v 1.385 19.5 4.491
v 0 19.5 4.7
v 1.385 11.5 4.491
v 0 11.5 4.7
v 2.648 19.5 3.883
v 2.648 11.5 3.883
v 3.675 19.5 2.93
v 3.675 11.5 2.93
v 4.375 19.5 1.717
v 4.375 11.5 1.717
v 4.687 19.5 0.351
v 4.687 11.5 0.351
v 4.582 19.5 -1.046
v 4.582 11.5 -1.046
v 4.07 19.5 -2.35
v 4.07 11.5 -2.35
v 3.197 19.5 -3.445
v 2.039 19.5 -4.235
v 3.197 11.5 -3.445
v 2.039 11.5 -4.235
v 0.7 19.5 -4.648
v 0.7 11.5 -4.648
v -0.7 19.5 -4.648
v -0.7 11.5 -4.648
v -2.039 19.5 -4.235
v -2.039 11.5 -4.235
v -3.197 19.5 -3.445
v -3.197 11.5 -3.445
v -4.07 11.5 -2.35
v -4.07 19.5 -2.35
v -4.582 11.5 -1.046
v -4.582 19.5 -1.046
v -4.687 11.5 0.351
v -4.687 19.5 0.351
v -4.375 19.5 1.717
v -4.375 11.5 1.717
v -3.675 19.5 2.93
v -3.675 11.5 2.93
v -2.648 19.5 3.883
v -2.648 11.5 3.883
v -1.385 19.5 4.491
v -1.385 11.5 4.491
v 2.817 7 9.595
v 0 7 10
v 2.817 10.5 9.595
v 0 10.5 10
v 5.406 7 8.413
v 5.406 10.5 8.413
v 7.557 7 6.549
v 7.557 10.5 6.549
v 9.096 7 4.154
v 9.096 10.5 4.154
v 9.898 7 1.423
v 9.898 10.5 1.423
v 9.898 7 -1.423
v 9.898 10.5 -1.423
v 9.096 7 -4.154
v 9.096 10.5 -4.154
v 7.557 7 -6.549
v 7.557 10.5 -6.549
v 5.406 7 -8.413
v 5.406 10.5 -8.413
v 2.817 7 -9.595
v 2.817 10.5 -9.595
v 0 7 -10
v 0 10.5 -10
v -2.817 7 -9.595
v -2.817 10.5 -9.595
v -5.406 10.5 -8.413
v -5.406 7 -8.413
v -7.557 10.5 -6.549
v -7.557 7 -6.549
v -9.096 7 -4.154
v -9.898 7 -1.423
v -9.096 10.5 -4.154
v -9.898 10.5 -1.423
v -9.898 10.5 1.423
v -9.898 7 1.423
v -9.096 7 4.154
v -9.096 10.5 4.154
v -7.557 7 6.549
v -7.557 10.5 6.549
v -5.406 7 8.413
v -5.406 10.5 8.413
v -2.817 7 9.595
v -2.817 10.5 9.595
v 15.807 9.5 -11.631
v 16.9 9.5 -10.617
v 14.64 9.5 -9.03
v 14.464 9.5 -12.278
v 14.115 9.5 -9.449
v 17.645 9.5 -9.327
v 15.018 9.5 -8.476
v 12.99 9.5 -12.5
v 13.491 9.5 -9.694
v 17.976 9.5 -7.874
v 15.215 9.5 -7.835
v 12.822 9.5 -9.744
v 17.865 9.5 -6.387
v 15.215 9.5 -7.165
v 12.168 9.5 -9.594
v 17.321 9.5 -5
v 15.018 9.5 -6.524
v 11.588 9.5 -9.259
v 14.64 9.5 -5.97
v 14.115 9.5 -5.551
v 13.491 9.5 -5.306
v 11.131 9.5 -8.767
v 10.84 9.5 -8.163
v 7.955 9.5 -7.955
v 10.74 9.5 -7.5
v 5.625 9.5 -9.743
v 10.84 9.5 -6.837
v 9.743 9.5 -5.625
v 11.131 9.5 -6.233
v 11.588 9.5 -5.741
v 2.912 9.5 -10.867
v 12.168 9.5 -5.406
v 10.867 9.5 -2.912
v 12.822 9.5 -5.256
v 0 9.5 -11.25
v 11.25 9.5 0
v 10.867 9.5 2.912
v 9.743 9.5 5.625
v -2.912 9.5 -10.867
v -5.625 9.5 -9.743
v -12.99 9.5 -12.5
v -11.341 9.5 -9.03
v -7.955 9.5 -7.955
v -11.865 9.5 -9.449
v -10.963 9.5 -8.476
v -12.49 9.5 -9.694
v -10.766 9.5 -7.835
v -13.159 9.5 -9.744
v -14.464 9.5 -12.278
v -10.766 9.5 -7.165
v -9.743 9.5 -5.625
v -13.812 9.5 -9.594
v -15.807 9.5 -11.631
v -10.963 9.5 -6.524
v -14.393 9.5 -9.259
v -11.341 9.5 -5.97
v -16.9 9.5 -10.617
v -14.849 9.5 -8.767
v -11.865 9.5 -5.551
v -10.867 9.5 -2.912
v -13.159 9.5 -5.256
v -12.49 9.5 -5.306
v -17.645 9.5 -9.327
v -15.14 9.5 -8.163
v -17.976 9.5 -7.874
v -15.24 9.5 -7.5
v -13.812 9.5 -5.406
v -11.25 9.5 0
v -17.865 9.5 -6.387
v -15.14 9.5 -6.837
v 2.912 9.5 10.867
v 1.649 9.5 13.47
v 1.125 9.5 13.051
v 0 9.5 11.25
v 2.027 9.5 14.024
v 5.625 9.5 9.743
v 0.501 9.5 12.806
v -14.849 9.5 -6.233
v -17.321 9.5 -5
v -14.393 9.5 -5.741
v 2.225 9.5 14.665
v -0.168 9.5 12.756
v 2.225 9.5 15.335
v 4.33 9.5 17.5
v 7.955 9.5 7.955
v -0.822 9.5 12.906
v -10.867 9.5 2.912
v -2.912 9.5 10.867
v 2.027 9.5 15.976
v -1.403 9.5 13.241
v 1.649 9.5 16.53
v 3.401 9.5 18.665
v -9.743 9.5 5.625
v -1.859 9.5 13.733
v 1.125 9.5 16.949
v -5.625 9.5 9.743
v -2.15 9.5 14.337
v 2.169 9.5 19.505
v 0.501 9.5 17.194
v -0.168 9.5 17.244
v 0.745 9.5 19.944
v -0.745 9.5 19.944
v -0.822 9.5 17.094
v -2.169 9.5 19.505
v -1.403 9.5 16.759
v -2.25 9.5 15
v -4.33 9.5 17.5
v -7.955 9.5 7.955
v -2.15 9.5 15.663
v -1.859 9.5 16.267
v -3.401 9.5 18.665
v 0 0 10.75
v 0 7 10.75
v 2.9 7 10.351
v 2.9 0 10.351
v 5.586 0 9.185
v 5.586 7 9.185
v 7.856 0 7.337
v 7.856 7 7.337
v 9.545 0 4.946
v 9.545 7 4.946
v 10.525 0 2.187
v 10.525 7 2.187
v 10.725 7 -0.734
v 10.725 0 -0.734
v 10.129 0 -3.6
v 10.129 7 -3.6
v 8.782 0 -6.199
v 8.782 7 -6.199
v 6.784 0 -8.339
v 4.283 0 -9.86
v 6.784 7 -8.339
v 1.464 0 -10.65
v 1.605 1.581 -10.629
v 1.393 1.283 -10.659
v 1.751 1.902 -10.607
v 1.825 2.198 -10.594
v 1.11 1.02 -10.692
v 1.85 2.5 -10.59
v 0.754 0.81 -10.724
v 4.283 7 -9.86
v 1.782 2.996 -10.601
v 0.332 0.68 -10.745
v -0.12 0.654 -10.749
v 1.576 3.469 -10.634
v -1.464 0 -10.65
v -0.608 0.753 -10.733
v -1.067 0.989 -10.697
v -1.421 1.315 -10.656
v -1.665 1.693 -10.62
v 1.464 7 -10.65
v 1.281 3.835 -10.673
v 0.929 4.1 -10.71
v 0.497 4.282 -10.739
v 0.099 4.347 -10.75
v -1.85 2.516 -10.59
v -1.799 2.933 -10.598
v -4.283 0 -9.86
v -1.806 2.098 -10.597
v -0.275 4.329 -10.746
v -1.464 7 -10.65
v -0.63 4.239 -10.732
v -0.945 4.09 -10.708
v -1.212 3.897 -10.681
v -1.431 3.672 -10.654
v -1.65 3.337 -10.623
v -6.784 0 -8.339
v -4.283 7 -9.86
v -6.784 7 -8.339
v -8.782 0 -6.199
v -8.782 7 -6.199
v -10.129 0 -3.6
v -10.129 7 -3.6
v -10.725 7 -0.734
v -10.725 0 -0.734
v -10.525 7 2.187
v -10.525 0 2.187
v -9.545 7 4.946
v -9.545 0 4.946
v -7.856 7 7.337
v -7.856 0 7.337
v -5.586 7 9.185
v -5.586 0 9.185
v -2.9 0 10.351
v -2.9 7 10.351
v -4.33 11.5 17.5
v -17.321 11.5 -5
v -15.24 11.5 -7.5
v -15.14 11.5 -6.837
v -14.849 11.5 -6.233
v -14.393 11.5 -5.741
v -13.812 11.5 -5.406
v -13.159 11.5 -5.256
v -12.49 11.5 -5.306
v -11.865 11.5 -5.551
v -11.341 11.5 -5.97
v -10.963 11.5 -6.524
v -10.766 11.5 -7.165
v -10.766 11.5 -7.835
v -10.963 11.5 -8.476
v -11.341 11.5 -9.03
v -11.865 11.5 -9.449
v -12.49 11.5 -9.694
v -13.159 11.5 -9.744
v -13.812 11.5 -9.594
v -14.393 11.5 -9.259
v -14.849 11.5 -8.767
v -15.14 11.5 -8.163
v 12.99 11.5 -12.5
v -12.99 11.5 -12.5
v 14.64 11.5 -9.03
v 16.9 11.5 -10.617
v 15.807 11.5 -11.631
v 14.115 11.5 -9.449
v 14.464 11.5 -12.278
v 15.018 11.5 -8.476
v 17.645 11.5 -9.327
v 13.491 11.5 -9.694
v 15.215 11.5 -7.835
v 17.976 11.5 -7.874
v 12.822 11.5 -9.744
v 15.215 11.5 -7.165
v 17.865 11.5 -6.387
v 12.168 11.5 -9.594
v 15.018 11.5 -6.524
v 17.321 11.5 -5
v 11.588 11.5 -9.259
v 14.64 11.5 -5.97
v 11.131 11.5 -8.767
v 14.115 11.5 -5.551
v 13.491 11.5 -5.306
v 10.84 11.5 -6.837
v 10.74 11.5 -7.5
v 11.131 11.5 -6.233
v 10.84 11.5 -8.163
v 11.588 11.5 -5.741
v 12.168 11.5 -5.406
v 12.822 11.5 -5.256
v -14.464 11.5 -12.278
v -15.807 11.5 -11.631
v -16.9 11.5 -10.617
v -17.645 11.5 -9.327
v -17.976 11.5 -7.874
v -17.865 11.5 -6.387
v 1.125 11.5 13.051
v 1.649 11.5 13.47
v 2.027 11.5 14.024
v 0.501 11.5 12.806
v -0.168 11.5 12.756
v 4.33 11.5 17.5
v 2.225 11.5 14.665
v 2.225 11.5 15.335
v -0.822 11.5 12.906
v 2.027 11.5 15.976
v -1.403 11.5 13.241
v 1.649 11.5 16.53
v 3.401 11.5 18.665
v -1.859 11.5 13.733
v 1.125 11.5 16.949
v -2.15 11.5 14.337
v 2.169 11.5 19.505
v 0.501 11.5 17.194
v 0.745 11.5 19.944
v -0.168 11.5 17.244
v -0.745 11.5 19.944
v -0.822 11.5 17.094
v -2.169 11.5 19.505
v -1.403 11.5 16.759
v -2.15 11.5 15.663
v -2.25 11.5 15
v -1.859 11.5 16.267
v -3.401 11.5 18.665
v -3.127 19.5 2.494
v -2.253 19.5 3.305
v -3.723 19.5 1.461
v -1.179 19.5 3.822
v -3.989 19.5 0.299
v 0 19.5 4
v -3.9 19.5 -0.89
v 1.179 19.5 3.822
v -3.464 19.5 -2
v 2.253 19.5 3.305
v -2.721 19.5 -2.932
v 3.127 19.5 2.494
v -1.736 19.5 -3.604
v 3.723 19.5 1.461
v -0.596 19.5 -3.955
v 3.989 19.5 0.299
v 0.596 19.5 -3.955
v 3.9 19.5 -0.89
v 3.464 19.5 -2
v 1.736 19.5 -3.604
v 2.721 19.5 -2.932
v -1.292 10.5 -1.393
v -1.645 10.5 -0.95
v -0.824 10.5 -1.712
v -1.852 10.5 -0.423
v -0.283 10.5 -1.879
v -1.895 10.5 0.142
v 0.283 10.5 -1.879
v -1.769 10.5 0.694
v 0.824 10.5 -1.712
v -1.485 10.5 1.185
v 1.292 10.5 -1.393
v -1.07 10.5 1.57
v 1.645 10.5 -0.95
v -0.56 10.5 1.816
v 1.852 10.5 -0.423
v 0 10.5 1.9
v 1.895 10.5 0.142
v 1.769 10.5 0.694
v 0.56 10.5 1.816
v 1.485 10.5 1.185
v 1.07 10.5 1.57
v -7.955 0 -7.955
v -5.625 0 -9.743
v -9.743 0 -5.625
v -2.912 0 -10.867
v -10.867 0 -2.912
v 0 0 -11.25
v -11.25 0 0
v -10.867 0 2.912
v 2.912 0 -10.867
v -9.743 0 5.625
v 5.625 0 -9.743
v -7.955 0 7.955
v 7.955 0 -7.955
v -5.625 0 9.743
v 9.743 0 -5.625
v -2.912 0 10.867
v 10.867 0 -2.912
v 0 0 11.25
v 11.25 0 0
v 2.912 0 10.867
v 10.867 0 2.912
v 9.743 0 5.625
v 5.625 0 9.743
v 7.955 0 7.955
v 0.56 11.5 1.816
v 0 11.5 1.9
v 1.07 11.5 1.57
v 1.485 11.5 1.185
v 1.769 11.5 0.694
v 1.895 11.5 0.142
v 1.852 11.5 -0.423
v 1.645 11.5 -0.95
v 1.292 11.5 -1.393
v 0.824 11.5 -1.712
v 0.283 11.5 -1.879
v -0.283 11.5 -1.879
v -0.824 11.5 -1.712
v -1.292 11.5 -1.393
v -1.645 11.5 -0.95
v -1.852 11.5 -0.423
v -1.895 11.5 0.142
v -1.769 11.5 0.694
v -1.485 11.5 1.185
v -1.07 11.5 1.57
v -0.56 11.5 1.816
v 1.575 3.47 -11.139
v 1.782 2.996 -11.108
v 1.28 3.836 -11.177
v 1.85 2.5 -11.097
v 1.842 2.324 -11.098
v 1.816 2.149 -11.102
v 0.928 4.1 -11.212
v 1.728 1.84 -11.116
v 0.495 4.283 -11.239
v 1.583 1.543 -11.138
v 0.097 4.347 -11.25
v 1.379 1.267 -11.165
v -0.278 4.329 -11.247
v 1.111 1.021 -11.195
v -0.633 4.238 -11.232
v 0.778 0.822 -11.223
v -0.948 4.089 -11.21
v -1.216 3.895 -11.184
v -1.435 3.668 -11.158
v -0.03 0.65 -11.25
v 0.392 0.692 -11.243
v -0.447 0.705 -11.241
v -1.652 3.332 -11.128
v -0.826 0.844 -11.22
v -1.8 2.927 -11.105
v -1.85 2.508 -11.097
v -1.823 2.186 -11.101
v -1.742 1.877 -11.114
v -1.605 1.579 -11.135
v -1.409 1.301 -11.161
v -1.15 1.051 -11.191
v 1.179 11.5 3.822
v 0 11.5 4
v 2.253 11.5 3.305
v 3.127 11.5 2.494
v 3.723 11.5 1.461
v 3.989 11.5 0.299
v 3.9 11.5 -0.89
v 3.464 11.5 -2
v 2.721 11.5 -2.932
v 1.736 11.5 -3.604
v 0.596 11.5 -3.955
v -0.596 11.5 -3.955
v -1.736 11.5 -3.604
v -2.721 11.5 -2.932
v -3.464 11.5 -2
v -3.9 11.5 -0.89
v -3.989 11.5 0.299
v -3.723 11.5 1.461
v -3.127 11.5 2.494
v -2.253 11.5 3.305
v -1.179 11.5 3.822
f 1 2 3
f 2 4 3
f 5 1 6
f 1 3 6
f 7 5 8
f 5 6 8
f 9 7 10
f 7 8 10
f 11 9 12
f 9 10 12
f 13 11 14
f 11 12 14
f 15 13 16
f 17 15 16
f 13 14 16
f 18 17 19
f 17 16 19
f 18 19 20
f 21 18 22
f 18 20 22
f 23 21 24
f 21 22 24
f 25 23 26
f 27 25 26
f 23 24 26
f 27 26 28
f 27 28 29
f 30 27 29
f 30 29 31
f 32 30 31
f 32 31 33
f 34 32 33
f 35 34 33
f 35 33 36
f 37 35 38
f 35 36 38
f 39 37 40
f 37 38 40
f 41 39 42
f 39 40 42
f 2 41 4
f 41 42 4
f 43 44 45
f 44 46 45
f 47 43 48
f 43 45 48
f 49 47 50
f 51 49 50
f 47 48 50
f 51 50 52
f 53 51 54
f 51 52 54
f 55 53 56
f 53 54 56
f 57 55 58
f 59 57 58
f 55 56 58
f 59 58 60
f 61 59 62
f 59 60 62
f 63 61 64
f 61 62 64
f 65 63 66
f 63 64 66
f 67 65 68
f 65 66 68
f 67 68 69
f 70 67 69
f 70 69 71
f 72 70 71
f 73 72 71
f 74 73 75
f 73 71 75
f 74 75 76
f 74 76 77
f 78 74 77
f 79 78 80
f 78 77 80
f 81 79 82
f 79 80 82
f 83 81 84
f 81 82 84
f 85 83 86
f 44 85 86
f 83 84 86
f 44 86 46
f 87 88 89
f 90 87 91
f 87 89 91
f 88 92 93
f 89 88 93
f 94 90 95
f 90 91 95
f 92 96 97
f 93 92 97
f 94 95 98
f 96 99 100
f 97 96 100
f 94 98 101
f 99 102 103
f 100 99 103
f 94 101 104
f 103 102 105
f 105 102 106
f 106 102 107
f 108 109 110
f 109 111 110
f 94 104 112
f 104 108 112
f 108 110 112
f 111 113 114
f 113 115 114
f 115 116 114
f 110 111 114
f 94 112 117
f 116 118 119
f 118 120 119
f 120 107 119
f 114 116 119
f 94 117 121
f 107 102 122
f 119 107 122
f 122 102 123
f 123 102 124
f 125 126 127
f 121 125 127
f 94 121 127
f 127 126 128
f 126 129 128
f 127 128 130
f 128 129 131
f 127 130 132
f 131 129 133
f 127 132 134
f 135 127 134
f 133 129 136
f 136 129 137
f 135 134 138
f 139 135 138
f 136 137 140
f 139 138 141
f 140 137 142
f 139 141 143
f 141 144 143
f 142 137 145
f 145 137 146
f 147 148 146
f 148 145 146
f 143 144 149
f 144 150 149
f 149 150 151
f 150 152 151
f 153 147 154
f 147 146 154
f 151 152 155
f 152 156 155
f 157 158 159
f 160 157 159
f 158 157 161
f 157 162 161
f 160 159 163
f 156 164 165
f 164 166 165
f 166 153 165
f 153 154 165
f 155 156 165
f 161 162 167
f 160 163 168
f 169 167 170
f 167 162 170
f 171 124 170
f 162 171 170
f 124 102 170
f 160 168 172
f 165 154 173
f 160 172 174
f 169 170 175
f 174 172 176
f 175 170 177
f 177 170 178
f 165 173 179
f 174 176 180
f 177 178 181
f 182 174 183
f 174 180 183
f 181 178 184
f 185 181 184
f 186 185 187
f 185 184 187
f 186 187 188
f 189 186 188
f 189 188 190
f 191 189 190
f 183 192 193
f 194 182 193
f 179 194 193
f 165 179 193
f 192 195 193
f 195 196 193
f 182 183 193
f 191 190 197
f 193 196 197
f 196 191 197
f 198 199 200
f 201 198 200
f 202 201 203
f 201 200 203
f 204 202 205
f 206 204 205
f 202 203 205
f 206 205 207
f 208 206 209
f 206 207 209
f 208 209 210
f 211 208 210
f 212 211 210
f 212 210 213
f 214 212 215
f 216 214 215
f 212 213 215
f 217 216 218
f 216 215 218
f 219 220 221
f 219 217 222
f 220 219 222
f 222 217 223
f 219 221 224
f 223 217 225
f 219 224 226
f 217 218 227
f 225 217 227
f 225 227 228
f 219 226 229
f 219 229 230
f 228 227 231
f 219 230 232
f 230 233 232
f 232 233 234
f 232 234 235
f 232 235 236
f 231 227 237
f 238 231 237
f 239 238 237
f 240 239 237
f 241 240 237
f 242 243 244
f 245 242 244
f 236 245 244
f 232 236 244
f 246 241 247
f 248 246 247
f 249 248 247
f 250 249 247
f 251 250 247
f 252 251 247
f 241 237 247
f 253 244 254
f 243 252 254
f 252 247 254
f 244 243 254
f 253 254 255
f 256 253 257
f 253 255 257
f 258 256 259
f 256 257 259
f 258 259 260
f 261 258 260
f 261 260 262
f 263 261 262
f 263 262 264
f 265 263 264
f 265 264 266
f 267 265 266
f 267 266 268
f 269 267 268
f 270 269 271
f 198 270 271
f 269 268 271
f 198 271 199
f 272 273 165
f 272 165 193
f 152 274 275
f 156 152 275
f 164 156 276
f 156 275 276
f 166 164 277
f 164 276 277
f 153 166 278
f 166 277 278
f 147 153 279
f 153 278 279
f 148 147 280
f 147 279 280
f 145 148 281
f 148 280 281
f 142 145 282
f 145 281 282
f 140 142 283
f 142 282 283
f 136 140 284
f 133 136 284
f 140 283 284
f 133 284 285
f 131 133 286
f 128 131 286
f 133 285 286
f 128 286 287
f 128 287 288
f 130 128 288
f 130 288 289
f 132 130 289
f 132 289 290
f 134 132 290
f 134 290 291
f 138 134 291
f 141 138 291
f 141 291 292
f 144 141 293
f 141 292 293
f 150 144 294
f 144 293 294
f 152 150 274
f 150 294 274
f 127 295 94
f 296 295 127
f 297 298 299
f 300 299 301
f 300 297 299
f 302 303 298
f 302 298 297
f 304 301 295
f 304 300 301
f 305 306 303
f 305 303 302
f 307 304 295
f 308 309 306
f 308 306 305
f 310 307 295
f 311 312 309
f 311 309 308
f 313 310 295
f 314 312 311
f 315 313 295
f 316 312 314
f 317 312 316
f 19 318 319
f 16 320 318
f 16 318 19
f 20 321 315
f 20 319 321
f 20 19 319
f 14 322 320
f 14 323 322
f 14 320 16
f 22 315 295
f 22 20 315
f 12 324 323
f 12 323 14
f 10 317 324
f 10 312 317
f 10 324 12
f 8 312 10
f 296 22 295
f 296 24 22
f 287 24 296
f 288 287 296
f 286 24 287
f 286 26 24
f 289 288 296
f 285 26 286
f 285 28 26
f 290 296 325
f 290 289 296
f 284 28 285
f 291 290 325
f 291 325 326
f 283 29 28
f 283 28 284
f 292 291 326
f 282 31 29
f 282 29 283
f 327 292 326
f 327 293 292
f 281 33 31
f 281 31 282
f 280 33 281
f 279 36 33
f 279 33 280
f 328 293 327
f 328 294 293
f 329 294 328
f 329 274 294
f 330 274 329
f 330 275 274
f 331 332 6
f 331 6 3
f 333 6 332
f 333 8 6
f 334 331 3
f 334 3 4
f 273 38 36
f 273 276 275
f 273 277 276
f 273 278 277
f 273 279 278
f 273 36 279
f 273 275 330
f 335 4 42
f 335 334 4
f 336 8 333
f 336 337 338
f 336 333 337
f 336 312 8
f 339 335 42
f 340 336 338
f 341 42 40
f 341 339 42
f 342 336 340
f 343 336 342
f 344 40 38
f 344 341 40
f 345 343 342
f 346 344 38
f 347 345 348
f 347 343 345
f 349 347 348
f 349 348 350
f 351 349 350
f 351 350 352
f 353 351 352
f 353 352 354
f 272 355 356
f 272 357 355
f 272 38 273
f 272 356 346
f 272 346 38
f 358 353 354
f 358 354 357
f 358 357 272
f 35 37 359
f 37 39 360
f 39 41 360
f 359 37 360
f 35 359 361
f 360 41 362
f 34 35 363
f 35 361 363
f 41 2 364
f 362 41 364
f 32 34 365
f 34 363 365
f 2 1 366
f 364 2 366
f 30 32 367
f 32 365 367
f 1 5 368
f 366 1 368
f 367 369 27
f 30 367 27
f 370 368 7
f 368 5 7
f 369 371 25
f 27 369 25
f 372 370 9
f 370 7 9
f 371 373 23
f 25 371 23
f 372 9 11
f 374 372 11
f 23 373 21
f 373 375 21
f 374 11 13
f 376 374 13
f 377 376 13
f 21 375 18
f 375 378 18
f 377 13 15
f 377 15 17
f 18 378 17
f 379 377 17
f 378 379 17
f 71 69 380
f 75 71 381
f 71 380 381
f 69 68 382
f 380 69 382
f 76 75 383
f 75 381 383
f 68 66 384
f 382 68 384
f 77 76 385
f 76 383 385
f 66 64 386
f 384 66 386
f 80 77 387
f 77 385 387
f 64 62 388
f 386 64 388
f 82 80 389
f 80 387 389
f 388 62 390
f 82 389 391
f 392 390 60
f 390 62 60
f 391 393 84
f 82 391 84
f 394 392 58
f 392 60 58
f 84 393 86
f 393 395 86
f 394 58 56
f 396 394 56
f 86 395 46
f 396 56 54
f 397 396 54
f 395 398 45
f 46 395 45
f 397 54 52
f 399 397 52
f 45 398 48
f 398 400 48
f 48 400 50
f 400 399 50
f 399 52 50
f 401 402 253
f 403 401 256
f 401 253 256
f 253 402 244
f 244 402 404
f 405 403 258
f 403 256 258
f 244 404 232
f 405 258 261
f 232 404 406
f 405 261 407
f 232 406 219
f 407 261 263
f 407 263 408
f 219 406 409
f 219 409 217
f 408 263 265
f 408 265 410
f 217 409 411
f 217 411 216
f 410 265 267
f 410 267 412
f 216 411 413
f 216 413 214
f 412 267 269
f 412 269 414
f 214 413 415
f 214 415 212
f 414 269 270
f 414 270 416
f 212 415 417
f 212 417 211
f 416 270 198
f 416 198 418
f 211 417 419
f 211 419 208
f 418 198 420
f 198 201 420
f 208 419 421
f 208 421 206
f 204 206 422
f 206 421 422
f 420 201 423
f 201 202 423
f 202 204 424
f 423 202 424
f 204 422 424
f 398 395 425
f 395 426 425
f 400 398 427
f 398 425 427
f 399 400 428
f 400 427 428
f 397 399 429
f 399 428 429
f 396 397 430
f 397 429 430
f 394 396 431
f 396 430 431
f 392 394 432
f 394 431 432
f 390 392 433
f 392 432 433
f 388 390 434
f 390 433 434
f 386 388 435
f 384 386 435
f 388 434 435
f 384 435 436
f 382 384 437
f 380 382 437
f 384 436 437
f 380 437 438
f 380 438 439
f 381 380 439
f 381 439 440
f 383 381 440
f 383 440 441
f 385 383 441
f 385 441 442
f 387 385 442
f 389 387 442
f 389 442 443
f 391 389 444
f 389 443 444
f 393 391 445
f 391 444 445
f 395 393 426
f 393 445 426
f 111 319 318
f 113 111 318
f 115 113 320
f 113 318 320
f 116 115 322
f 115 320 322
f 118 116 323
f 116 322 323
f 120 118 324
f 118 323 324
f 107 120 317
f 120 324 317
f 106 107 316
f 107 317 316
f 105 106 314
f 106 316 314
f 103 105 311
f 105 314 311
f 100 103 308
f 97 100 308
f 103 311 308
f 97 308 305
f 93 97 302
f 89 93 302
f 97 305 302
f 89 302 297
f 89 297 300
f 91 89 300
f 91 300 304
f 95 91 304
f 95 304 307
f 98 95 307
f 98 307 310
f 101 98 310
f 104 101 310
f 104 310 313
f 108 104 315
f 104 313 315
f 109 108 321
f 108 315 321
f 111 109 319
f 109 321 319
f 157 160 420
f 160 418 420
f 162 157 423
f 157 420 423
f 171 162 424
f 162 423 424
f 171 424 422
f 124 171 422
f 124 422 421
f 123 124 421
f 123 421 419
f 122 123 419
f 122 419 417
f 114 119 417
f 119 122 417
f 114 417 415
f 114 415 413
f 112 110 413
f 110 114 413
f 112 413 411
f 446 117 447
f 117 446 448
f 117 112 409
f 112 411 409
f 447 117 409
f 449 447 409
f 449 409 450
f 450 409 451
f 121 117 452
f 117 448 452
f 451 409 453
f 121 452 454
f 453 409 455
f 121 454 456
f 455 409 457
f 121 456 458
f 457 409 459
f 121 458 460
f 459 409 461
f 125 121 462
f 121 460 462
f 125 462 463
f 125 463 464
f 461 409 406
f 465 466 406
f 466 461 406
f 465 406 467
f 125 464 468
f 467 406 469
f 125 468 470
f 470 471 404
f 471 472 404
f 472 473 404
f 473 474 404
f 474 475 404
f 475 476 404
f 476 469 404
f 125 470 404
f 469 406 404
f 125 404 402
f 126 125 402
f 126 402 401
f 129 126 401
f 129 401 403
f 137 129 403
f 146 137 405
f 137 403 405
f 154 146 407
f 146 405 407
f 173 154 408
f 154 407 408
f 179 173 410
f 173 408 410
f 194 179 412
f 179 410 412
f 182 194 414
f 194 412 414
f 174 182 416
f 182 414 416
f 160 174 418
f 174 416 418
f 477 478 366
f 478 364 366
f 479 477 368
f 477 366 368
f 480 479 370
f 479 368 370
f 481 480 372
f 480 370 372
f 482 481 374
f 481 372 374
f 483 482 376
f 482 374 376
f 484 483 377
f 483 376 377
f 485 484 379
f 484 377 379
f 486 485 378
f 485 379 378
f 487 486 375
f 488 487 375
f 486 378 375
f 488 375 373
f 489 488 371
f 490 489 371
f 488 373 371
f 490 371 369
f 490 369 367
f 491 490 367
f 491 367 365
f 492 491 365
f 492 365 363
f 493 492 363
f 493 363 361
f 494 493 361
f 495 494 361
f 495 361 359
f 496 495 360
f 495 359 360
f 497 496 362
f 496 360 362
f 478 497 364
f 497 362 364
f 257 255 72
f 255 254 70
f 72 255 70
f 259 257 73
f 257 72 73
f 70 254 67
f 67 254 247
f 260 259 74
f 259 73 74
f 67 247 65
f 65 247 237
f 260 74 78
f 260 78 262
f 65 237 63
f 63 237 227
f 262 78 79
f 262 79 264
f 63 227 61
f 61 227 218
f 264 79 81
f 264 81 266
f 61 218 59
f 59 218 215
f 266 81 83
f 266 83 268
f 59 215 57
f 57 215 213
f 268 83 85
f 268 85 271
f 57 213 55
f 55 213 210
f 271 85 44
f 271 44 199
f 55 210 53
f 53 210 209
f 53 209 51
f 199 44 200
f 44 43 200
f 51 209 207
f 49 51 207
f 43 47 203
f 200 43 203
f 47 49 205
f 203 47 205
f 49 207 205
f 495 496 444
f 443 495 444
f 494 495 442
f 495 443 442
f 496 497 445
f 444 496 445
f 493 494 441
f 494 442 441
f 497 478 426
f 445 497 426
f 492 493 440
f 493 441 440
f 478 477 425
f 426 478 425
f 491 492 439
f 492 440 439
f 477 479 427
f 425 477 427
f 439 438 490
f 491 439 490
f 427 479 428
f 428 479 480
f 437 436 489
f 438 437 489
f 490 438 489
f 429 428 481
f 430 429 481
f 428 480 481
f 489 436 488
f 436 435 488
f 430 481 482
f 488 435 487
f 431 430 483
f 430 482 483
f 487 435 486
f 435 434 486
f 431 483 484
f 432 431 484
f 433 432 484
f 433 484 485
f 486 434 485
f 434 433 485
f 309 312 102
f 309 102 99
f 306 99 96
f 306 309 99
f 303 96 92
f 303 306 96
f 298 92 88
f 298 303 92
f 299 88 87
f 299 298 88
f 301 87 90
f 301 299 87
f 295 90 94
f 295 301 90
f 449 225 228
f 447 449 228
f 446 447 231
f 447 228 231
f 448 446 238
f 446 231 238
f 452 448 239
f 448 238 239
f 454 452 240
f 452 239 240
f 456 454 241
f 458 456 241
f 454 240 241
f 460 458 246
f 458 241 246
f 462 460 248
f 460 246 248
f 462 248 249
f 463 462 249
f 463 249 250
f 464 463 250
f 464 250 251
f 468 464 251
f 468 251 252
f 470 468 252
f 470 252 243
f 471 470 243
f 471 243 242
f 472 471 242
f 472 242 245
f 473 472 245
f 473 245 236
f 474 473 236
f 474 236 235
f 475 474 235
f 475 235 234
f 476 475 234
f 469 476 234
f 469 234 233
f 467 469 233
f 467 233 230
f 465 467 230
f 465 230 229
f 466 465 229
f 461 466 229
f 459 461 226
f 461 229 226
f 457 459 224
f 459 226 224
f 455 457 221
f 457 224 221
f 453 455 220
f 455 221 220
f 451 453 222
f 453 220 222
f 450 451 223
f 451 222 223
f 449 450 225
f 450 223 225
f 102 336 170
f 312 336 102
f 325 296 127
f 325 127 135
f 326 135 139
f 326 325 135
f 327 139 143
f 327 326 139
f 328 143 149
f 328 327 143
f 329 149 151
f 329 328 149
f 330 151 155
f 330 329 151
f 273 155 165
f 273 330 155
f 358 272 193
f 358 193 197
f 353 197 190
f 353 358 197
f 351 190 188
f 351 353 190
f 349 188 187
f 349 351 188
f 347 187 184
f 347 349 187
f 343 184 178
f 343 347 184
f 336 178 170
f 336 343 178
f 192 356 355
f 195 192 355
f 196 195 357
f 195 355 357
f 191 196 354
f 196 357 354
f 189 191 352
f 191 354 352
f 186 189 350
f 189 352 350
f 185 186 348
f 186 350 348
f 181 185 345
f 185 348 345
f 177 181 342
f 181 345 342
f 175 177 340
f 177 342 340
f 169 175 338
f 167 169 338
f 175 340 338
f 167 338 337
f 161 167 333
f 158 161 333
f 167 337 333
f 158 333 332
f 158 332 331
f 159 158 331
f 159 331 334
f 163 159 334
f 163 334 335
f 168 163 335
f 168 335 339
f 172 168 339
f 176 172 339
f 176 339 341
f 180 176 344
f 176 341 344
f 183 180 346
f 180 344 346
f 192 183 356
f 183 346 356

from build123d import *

# Parameters (mm, degrees)
F2_R     = 1.85
F3_DEPTH = 11.251
F4_R     = 2.25
F4_R_2   = 11.25
F4_R_3   = 10.75
F5_DEPTH = 2


with BuildPart() as f1:
    # F0 (on Right) → F1 (revolve)
    with BuildSketch(Plane.YZ):
        Polygon((11.5, 11.25), (0, 11.25), (0, 10.75), (7, 10.75), (7, 10), (10.5, 10), (10.5, 1.9), (11.5, 1.9), (11.5, 4), (19.5, 4), (19.5, 4.7), (11.5, 4.7), align=None)
    revolve(axis=Axis((0, 13.454885, 0), (0, 1, 0)))

    # F2 (on Top) → F3 (cut, through all)
    with BuildSketch(Plane.XY):
        with Locations((0, 2.5)):
            Circle(F2_R)
    extrude(amount=-F3_DEPTH, mode=Mode.SUBTRACT)

    # F4 (on face) → F5 (join)
    with BuildSketch(Plane(origin=(0, 11.5, 0), x_dir=(-1, 0, 0), z_dir=(0, 1, 0))):
        with BuildLine():
            Line((17.320508, -5), (4.330127, 17.5))
            ThreePointArc((4.330127, 17.5), (0, 20), (-4.330127, 17.5))
            Line((-4.330127, 17.5), (-17.320508, -5))
            ThreePointArc((-17.320508, -5), (-17.320508, -10), (-12.990381, -12.5))
            Line((-12.990381, -12.5), (12.990381, -12.5))
            ThreePointArc((12.990381, -12.5), (17.320508, -10), (17.320508, -5))
        make_face()
        with Locations((-12.990381, -7.5)):
            Circle(F4_R, mode=Mode.SUBTRACT)
        Circle(F4_R_2, mode=Mode.SUBTRACT)
        with Locations((12.990381, -7.5)):
            Circle(F4_R, mode=Mode.SUBTRACT)
        with Locations((0, 15)):
            Circle(F4_R, mode=Mode.SUBTRACT)
        Circle(F4_R_2)
        Circle(F4_R_3, mode=Mode.SUBTRACT)
    extrude(amount=-F5_DEPTH)


solid = f1.part
